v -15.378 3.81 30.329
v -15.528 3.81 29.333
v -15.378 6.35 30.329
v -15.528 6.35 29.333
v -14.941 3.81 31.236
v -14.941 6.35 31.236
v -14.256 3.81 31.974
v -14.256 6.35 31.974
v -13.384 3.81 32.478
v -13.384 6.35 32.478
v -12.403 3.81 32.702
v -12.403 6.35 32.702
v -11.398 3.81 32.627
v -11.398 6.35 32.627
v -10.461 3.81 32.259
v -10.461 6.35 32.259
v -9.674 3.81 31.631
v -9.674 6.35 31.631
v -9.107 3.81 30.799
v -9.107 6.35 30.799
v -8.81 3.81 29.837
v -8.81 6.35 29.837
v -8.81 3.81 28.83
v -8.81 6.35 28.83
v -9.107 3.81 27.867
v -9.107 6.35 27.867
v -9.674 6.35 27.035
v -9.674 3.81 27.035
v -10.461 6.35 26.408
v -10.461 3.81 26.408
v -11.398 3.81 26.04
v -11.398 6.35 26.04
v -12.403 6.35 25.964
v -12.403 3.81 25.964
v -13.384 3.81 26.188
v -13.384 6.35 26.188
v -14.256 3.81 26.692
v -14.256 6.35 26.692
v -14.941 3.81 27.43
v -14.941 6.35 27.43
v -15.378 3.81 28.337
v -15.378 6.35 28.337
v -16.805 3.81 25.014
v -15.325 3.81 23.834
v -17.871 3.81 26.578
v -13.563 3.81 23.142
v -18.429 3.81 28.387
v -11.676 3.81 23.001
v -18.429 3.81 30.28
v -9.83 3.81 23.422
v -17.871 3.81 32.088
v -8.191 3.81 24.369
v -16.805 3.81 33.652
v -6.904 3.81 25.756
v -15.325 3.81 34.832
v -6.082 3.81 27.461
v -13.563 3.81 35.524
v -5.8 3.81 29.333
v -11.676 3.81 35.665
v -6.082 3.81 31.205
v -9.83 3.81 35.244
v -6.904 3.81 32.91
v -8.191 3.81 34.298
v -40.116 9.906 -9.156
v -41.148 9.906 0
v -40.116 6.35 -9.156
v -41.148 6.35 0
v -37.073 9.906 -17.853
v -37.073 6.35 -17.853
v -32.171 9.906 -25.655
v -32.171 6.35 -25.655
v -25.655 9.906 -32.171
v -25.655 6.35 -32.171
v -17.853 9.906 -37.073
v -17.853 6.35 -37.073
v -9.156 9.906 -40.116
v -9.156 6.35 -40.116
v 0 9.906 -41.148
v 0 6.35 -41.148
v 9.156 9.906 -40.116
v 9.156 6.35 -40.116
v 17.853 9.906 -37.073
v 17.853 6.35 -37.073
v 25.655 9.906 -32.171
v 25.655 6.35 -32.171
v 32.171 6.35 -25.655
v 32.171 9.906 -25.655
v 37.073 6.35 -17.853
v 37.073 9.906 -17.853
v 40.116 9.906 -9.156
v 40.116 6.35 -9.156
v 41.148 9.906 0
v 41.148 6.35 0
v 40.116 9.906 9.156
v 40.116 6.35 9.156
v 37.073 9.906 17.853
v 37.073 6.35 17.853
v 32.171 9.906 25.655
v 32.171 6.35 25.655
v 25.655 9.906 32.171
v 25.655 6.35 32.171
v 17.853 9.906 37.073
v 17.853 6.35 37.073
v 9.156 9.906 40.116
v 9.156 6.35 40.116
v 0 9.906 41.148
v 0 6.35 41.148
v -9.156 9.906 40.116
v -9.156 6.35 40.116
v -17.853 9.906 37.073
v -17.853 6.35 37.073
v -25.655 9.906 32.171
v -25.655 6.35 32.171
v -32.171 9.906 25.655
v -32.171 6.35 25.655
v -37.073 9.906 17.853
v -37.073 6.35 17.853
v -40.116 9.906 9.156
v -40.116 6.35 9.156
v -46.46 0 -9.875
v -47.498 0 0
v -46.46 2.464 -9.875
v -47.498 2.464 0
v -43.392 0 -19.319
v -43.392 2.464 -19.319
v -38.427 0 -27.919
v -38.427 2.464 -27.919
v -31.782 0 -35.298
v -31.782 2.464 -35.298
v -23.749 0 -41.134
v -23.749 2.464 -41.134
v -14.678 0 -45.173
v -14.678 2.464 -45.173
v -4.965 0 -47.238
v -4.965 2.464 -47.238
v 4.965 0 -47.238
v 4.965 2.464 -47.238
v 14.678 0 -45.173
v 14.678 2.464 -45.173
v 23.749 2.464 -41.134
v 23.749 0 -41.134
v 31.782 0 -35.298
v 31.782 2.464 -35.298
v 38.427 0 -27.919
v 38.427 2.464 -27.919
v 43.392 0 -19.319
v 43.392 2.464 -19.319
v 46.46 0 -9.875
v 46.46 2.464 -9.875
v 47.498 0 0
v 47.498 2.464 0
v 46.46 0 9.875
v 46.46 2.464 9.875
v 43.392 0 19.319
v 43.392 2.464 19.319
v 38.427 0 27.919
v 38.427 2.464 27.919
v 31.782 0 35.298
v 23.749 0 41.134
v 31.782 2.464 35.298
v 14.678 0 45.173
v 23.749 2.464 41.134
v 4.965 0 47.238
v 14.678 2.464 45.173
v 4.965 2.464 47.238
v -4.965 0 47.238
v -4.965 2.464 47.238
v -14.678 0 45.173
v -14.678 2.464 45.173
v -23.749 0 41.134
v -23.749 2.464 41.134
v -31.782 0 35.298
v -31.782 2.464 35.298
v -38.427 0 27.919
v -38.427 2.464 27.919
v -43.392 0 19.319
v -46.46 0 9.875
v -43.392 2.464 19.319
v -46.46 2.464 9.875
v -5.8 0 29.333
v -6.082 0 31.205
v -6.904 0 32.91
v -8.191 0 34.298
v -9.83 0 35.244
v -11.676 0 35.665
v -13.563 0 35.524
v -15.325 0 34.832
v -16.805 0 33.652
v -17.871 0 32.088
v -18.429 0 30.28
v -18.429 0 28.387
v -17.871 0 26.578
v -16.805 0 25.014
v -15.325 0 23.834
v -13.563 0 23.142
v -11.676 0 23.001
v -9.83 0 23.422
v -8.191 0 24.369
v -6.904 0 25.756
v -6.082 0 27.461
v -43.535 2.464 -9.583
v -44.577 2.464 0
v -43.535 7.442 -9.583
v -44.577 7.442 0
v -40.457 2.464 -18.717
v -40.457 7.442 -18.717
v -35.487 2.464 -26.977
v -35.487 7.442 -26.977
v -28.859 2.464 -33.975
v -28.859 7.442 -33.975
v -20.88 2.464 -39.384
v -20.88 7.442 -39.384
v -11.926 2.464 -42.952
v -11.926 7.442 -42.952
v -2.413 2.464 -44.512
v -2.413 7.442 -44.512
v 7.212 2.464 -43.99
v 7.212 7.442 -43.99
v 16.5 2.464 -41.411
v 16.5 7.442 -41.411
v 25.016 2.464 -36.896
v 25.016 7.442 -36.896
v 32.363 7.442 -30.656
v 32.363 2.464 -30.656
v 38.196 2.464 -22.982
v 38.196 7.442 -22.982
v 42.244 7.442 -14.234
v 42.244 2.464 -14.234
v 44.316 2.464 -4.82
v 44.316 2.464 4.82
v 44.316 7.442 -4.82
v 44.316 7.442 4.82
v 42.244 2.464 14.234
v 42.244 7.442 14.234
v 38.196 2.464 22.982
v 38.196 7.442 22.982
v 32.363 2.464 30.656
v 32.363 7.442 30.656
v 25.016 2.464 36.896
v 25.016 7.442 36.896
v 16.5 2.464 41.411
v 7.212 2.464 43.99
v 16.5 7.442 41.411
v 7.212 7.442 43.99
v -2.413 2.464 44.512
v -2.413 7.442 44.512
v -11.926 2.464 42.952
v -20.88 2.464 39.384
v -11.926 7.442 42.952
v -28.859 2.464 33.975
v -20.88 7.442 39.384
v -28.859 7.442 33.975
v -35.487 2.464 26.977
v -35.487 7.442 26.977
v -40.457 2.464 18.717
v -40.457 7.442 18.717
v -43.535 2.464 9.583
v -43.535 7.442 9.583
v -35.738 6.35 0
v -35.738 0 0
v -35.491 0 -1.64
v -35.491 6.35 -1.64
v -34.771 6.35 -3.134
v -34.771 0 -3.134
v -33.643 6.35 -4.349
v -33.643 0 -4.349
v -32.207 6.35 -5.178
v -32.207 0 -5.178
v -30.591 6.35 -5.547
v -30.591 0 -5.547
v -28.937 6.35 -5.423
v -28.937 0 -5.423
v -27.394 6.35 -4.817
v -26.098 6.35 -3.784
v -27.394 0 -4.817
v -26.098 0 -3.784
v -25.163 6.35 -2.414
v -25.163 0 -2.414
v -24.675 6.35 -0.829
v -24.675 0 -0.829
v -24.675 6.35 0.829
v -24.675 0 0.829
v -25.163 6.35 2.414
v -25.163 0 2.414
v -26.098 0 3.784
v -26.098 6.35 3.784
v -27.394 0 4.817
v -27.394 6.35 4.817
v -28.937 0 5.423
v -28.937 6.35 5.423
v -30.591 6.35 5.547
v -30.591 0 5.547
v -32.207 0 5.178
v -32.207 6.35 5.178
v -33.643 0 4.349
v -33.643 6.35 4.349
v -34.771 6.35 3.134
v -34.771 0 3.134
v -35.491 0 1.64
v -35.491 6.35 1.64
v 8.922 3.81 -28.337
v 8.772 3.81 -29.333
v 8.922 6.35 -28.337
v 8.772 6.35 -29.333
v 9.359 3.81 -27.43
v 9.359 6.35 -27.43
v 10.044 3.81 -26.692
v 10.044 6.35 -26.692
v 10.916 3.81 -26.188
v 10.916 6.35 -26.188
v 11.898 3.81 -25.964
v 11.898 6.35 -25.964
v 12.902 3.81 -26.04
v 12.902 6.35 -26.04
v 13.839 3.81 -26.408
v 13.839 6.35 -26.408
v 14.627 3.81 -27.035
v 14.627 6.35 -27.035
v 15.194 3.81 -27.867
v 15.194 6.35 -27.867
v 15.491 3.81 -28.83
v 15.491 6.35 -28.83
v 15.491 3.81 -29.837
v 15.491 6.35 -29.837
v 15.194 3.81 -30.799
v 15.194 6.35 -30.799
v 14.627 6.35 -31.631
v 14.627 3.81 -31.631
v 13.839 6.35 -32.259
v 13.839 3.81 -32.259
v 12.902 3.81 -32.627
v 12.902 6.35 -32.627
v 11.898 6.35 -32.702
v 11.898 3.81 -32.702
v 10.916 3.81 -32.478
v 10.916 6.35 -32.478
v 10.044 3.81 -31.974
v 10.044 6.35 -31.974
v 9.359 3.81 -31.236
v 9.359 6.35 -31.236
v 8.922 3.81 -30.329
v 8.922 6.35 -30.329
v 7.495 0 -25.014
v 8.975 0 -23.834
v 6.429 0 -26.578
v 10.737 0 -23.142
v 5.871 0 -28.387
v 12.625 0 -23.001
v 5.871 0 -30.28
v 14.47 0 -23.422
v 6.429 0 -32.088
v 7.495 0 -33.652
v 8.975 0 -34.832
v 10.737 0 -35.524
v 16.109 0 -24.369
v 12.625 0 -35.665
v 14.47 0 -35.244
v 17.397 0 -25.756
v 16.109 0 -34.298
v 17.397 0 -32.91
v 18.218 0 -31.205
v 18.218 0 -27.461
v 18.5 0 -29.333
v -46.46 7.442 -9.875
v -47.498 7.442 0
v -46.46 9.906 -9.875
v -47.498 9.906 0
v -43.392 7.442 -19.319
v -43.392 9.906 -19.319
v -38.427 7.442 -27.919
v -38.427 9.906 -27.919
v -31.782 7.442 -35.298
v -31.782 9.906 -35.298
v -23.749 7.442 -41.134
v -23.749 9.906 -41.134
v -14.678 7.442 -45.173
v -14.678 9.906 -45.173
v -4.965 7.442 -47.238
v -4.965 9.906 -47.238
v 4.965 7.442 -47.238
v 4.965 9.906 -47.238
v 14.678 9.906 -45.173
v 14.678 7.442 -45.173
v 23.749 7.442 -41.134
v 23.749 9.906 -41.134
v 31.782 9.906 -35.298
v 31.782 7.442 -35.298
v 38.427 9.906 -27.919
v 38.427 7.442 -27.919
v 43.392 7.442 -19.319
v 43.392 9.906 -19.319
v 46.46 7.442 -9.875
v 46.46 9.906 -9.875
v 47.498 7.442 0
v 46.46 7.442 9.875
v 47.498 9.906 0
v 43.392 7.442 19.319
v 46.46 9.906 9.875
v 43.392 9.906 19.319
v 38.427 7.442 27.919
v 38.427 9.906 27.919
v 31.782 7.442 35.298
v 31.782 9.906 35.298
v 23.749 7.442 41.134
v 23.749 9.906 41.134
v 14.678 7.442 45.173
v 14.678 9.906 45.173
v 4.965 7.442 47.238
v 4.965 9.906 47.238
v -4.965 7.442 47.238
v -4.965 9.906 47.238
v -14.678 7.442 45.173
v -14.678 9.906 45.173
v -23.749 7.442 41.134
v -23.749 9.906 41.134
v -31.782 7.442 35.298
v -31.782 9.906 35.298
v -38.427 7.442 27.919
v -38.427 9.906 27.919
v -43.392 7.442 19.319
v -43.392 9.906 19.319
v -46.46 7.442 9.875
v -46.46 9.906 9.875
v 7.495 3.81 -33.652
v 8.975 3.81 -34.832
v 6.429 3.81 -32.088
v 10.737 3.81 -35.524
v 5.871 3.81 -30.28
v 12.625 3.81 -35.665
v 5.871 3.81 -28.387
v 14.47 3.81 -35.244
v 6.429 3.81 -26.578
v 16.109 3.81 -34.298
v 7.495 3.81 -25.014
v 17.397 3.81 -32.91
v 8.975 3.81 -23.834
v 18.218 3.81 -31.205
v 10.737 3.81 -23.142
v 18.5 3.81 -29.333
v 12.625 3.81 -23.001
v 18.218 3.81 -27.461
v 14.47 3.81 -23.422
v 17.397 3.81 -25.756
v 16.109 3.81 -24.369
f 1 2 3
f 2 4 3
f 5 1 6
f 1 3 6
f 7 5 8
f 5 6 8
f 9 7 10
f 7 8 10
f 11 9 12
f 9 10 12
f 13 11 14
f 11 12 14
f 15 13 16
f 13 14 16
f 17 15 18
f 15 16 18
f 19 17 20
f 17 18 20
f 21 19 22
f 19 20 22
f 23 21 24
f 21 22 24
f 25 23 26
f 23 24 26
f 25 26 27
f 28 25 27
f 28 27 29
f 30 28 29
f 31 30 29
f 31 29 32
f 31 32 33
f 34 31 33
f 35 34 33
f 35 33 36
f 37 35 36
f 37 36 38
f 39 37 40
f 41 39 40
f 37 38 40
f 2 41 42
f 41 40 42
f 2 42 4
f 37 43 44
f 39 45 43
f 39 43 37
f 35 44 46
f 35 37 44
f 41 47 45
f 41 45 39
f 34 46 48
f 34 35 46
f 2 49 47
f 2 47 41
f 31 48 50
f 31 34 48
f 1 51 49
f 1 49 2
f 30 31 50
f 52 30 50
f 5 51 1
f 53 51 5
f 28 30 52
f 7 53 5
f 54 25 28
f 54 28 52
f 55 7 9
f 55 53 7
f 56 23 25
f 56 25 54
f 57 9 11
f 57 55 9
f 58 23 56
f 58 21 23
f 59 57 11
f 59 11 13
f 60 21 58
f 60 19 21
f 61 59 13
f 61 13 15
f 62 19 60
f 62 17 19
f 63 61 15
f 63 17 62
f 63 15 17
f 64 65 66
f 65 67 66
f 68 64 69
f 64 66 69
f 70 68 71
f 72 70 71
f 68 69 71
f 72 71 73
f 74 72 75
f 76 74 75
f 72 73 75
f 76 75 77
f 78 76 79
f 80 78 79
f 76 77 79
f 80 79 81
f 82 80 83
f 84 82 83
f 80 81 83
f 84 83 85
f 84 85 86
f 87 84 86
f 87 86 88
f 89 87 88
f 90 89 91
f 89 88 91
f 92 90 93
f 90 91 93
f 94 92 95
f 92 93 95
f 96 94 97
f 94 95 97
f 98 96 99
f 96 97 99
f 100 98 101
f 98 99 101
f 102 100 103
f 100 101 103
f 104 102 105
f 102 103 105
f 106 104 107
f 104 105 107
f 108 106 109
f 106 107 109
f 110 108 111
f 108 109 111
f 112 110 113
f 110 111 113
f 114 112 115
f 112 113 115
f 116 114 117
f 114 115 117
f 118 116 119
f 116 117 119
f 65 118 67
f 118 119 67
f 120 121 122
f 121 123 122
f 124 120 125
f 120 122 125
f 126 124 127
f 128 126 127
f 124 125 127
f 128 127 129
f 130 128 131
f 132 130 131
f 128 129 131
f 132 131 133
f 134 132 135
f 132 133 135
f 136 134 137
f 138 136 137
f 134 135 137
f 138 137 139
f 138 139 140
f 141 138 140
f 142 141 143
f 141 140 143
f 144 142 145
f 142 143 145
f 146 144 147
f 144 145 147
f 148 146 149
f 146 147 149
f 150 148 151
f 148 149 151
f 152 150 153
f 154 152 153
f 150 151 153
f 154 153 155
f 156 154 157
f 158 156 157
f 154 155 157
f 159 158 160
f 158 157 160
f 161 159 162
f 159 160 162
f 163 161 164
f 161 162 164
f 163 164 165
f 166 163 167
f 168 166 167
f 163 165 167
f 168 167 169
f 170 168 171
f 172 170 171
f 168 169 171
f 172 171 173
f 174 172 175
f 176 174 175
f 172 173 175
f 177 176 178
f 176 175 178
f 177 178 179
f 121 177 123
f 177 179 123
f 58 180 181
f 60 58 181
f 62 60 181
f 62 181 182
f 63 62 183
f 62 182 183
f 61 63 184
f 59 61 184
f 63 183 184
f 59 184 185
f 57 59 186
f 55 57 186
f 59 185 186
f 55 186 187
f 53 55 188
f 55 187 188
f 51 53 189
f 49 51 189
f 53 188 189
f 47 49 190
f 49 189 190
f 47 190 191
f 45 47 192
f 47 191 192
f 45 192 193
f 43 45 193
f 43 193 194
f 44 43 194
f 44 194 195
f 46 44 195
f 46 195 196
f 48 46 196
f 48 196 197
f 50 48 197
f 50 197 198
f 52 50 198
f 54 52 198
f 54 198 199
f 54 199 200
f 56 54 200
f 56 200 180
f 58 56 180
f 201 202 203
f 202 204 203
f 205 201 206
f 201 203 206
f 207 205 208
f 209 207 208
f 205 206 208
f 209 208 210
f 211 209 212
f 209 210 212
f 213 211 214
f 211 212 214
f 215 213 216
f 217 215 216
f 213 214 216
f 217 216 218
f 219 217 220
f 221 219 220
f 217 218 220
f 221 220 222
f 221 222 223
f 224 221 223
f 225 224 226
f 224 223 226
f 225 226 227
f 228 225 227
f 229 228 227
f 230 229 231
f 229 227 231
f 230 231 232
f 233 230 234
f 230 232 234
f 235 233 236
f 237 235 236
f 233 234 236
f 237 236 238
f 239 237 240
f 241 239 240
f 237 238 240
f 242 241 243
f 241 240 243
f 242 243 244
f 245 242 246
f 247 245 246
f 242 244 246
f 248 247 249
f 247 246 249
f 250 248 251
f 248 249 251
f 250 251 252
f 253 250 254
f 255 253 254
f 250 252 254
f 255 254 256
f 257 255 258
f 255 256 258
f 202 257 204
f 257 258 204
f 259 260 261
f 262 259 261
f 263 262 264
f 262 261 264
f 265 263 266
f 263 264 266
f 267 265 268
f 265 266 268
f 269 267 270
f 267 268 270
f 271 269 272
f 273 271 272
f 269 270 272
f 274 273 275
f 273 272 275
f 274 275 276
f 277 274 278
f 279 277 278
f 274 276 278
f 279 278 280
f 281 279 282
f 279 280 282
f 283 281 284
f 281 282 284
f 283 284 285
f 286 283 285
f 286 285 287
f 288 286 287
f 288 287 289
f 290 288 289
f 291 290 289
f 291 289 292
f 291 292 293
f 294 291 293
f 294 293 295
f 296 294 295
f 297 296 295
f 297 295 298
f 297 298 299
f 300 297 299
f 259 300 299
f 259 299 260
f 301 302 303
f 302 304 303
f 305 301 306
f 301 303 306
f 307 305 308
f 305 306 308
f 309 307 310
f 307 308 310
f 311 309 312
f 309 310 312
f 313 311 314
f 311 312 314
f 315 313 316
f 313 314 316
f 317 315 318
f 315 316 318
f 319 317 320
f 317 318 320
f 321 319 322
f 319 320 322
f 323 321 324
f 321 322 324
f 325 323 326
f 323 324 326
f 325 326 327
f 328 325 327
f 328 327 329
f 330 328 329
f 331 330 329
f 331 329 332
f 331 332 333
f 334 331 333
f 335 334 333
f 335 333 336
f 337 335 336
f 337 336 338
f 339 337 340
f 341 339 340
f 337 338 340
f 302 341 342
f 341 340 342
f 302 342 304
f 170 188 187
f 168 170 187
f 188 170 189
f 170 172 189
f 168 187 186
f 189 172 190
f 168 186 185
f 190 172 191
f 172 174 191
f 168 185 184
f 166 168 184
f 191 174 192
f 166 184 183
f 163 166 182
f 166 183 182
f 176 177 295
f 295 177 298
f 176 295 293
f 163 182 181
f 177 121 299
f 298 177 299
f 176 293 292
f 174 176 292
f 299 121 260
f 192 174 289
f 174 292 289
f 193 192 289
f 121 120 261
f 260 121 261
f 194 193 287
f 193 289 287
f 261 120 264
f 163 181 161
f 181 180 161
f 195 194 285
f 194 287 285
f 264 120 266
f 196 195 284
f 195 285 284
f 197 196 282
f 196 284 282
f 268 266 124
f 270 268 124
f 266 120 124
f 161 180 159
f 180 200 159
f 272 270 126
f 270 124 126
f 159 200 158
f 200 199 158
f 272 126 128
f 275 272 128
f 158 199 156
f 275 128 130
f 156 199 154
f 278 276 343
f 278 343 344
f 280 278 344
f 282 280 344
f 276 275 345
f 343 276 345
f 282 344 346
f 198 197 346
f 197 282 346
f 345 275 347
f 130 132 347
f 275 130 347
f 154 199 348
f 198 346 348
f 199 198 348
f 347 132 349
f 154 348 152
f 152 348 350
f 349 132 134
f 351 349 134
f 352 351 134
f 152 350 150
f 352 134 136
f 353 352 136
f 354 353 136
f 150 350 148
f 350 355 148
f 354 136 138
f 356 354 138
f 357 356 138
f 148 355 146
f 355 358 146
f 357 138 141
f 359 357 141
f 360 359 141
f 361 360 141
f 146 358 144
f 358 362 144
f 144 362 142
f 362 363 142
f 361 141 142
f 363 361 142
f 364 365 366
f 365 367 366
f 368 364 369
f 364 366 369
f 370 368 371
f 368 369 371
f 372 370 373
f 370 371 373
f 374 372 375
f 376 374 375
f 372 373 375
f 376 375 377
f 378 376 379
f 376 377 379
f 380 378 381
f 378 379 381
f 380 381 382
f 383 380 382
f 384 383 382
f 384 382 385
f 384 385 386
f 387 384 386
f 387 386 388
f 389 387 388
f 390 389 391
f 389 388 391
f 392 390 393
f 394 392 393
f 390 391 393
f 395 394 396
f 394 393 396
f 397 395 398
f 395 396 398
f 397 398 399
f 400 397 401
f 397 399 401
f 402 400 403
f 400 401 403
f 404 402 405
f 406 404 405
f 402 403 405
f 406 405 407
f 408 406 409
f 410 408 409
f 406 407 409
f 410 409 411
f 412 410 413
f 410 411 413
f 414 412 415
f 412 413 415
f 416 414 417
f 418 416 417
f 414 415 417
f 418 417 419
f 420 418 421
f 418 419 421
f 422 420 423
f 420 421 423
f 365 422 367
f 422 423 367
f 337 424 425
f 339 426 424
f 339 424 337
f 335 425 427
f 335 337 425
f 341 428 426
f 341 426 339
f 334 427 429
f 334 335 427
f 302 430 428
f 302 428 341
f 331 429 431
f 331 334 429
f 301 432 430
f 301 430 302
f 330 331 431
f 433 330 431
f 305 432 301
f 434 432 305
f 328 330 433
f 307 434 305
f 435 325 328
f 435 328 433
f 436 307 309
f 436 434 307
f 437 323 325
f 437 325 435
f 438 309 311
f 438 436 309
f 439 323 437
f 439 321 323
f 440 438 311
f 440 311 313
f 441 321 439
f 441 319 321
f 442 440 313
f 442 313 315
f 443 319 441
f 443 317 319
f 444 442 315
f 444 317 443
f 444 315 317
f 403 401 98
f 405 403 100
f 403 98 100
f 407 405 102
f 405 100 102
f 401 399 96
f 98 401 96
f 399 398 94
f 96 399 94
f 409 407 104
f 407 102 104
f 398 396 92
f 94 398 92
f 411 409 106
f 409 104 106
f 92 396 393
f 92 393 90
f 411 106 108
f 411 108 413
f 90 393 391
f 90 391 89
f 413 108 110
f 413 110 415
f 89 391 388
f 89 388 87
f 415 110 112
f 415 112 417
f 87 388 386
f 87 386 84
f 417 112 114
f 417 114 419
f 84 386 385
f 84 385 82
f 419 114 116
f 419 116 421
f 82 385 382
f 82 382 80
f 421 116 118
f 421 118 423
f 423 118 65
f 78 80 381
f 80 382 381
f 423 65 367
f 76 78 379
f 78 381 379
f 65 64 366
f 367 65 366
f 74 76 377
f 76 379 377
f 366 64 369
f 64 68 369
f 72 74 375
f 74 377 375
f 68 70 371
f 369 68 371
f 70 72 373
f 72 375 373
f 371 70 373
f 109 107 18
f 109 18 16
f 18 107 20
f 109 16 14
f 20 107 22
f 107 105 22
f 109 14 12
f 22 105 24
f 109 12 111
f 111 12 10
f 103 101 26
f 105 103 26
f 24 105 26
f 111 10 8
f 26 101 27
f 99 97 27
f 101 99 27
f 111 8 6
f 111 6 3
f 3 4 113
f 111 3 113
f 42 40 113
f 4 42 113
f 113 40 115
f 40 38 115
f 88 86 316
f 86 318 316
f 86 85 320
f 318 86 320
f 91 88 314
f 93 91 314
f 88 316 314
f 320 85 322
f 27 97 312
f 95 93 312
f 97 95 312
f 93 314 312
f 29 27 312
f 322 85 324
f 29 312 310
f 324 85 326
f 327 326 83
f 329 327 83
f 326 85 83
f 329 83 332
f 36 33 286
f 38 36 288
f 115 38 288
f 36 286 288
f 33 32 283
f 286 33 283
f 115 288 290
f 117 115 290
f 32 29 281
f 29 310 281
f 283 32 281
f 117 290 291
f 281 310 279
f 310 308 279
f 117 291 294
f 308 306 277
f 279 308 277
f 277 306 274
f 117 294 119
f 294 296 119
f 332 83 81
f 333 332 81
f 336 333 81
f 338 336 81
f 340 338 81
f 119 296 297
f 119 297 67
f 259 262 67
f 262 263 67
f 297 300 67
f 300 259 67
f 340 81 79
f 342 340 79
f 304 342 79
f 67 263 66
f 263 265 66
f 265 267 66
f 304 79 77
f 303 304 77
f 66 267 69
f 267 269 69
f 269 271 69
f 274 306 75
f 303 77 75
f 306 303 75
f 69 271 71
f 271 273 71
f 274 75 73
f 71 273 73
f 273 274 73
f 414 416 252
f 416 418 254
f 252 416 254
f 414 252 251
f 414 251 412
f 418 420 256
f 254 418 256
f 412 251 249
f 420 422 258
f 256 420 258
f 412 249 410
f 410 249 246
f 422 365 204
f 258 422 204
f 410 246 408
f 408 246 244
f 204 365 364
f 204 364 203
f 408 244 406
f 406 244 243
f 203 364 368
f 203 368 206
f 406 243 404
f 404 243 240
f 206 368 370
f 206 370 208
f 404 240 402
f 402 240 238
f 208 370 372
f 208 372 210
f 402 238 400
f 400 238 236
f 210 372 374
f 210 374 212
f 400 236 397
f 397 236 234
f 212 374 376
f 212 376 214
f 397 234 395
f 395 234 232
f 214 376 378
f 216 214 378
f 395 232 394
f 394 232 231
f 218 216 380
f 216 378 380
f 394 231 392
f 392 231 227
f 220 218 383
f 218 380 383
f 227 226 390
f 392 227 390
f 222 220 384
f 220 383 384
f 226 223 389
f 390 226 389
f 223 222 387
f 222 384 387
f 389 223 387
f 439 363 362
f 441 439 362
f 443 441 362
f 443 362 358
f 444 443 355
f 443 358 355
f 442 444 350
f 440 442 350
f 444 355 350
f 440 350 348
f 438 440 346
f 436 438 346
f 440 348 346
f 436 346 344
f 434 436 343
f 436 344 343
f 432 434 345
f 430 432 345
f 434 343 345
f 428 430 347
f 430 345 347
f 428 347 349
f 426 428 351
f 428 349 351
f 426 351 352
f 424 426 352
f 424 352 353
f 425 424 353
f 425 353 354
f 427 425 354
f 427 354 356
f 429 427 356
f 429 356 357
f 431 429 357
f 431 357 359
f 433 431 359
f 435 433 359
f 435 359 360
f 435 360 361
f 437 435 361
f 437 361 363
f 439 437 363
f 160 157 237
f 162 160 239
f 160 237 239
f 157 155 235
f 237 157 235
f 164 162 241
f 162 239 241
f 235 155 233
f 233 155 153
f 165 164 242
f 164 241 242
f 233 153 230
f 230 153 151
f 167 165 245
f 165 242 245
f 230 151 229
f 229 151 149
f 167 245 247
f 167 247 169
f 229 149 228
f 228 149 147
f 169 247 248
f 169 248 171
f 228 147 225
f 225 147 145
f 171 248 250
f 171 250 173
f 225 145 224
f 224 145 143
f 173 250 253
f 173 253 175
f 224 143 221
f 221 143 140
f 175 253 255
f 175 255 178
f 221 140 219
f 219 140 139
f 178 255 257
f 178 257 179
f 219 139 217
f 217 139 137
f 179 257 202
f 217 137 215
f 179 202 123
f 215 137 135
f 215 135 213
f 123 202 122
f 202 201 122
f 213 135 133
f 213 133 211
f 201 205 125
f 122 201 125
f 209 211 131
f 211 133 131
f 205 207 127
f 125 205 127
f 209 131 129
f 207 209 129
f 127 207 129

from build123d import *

# Parameters (mm, degrees)
TAP_DRILL_FOR_1_4_TAP_1_4_18_NPT_D                   = 11.1252
CBORE_FOR_1_4_BINDING_HEAD_MACHINE_SCREW_D           = 6.7564
CBORE_FOR_1_4_BINDING_HEAD_MACHINE_SCREW_CBORE_D     = 12.7
CBORE_FOR_1_4_BINDING_HEAD_MACHINE_SCREW_CBORE_DEPTH = 3.81


with BuildPart() as part:
    # Sketch1 → Revolve1 (revolve)
    with BuildSketch(Plane.XY, mode=Mode.PRIVATE) as revolve1_sk:
        Polygon((0, 0), (47.498, 0), (47.498, 2.4638), (44.577, 2.4638), (44.577, 7.4422), (47.498, 7.4422), (47.498, 9.906), (41.148, 9.906), (41.148, 6.35), (0, 6.35), align=None)
    revolve(revolve1_sk.sketch.rotate(Axis((0, 48.192213231, 0), (0, -1, 0)), 180), axis=Axis((0, 48.192213231, 0), (0, -1, 0)))

    # Tap Drill for 1/4 Tap - 1/4-18 NPT (through all)
    with Locations(Plane(origin=(0, 6.35, 0), x_dir=(1, 0, 0), z_dir=(0, 1, 0))):
        with Locations((-30.1752, 0)):
            Hole(TAP_DRILL_FOR_1_4_TAP_1_4_18_NPT_D / 2)

    # CBORE for 1/4 Binding Head Machine Screw1 (through all)
    with Locations(Plane.XZ):
        with Locations((12.150198978, -29.333175157), (-12.150198978, 29.333175157)):
            CounterBoreHole(CBORE_FOR_1_4_BINDING_HEAD_MACHINE_SCREW_D / 2, CBORE_FOR_1_4_BINDING_HEAD_MACHINE_SCREW_CBORE_D / 2, CBORE_FOR_1_4_BINDING_HEAD_MACHINE_SCREW_CBORE_DEPTH)


solid = part.part
